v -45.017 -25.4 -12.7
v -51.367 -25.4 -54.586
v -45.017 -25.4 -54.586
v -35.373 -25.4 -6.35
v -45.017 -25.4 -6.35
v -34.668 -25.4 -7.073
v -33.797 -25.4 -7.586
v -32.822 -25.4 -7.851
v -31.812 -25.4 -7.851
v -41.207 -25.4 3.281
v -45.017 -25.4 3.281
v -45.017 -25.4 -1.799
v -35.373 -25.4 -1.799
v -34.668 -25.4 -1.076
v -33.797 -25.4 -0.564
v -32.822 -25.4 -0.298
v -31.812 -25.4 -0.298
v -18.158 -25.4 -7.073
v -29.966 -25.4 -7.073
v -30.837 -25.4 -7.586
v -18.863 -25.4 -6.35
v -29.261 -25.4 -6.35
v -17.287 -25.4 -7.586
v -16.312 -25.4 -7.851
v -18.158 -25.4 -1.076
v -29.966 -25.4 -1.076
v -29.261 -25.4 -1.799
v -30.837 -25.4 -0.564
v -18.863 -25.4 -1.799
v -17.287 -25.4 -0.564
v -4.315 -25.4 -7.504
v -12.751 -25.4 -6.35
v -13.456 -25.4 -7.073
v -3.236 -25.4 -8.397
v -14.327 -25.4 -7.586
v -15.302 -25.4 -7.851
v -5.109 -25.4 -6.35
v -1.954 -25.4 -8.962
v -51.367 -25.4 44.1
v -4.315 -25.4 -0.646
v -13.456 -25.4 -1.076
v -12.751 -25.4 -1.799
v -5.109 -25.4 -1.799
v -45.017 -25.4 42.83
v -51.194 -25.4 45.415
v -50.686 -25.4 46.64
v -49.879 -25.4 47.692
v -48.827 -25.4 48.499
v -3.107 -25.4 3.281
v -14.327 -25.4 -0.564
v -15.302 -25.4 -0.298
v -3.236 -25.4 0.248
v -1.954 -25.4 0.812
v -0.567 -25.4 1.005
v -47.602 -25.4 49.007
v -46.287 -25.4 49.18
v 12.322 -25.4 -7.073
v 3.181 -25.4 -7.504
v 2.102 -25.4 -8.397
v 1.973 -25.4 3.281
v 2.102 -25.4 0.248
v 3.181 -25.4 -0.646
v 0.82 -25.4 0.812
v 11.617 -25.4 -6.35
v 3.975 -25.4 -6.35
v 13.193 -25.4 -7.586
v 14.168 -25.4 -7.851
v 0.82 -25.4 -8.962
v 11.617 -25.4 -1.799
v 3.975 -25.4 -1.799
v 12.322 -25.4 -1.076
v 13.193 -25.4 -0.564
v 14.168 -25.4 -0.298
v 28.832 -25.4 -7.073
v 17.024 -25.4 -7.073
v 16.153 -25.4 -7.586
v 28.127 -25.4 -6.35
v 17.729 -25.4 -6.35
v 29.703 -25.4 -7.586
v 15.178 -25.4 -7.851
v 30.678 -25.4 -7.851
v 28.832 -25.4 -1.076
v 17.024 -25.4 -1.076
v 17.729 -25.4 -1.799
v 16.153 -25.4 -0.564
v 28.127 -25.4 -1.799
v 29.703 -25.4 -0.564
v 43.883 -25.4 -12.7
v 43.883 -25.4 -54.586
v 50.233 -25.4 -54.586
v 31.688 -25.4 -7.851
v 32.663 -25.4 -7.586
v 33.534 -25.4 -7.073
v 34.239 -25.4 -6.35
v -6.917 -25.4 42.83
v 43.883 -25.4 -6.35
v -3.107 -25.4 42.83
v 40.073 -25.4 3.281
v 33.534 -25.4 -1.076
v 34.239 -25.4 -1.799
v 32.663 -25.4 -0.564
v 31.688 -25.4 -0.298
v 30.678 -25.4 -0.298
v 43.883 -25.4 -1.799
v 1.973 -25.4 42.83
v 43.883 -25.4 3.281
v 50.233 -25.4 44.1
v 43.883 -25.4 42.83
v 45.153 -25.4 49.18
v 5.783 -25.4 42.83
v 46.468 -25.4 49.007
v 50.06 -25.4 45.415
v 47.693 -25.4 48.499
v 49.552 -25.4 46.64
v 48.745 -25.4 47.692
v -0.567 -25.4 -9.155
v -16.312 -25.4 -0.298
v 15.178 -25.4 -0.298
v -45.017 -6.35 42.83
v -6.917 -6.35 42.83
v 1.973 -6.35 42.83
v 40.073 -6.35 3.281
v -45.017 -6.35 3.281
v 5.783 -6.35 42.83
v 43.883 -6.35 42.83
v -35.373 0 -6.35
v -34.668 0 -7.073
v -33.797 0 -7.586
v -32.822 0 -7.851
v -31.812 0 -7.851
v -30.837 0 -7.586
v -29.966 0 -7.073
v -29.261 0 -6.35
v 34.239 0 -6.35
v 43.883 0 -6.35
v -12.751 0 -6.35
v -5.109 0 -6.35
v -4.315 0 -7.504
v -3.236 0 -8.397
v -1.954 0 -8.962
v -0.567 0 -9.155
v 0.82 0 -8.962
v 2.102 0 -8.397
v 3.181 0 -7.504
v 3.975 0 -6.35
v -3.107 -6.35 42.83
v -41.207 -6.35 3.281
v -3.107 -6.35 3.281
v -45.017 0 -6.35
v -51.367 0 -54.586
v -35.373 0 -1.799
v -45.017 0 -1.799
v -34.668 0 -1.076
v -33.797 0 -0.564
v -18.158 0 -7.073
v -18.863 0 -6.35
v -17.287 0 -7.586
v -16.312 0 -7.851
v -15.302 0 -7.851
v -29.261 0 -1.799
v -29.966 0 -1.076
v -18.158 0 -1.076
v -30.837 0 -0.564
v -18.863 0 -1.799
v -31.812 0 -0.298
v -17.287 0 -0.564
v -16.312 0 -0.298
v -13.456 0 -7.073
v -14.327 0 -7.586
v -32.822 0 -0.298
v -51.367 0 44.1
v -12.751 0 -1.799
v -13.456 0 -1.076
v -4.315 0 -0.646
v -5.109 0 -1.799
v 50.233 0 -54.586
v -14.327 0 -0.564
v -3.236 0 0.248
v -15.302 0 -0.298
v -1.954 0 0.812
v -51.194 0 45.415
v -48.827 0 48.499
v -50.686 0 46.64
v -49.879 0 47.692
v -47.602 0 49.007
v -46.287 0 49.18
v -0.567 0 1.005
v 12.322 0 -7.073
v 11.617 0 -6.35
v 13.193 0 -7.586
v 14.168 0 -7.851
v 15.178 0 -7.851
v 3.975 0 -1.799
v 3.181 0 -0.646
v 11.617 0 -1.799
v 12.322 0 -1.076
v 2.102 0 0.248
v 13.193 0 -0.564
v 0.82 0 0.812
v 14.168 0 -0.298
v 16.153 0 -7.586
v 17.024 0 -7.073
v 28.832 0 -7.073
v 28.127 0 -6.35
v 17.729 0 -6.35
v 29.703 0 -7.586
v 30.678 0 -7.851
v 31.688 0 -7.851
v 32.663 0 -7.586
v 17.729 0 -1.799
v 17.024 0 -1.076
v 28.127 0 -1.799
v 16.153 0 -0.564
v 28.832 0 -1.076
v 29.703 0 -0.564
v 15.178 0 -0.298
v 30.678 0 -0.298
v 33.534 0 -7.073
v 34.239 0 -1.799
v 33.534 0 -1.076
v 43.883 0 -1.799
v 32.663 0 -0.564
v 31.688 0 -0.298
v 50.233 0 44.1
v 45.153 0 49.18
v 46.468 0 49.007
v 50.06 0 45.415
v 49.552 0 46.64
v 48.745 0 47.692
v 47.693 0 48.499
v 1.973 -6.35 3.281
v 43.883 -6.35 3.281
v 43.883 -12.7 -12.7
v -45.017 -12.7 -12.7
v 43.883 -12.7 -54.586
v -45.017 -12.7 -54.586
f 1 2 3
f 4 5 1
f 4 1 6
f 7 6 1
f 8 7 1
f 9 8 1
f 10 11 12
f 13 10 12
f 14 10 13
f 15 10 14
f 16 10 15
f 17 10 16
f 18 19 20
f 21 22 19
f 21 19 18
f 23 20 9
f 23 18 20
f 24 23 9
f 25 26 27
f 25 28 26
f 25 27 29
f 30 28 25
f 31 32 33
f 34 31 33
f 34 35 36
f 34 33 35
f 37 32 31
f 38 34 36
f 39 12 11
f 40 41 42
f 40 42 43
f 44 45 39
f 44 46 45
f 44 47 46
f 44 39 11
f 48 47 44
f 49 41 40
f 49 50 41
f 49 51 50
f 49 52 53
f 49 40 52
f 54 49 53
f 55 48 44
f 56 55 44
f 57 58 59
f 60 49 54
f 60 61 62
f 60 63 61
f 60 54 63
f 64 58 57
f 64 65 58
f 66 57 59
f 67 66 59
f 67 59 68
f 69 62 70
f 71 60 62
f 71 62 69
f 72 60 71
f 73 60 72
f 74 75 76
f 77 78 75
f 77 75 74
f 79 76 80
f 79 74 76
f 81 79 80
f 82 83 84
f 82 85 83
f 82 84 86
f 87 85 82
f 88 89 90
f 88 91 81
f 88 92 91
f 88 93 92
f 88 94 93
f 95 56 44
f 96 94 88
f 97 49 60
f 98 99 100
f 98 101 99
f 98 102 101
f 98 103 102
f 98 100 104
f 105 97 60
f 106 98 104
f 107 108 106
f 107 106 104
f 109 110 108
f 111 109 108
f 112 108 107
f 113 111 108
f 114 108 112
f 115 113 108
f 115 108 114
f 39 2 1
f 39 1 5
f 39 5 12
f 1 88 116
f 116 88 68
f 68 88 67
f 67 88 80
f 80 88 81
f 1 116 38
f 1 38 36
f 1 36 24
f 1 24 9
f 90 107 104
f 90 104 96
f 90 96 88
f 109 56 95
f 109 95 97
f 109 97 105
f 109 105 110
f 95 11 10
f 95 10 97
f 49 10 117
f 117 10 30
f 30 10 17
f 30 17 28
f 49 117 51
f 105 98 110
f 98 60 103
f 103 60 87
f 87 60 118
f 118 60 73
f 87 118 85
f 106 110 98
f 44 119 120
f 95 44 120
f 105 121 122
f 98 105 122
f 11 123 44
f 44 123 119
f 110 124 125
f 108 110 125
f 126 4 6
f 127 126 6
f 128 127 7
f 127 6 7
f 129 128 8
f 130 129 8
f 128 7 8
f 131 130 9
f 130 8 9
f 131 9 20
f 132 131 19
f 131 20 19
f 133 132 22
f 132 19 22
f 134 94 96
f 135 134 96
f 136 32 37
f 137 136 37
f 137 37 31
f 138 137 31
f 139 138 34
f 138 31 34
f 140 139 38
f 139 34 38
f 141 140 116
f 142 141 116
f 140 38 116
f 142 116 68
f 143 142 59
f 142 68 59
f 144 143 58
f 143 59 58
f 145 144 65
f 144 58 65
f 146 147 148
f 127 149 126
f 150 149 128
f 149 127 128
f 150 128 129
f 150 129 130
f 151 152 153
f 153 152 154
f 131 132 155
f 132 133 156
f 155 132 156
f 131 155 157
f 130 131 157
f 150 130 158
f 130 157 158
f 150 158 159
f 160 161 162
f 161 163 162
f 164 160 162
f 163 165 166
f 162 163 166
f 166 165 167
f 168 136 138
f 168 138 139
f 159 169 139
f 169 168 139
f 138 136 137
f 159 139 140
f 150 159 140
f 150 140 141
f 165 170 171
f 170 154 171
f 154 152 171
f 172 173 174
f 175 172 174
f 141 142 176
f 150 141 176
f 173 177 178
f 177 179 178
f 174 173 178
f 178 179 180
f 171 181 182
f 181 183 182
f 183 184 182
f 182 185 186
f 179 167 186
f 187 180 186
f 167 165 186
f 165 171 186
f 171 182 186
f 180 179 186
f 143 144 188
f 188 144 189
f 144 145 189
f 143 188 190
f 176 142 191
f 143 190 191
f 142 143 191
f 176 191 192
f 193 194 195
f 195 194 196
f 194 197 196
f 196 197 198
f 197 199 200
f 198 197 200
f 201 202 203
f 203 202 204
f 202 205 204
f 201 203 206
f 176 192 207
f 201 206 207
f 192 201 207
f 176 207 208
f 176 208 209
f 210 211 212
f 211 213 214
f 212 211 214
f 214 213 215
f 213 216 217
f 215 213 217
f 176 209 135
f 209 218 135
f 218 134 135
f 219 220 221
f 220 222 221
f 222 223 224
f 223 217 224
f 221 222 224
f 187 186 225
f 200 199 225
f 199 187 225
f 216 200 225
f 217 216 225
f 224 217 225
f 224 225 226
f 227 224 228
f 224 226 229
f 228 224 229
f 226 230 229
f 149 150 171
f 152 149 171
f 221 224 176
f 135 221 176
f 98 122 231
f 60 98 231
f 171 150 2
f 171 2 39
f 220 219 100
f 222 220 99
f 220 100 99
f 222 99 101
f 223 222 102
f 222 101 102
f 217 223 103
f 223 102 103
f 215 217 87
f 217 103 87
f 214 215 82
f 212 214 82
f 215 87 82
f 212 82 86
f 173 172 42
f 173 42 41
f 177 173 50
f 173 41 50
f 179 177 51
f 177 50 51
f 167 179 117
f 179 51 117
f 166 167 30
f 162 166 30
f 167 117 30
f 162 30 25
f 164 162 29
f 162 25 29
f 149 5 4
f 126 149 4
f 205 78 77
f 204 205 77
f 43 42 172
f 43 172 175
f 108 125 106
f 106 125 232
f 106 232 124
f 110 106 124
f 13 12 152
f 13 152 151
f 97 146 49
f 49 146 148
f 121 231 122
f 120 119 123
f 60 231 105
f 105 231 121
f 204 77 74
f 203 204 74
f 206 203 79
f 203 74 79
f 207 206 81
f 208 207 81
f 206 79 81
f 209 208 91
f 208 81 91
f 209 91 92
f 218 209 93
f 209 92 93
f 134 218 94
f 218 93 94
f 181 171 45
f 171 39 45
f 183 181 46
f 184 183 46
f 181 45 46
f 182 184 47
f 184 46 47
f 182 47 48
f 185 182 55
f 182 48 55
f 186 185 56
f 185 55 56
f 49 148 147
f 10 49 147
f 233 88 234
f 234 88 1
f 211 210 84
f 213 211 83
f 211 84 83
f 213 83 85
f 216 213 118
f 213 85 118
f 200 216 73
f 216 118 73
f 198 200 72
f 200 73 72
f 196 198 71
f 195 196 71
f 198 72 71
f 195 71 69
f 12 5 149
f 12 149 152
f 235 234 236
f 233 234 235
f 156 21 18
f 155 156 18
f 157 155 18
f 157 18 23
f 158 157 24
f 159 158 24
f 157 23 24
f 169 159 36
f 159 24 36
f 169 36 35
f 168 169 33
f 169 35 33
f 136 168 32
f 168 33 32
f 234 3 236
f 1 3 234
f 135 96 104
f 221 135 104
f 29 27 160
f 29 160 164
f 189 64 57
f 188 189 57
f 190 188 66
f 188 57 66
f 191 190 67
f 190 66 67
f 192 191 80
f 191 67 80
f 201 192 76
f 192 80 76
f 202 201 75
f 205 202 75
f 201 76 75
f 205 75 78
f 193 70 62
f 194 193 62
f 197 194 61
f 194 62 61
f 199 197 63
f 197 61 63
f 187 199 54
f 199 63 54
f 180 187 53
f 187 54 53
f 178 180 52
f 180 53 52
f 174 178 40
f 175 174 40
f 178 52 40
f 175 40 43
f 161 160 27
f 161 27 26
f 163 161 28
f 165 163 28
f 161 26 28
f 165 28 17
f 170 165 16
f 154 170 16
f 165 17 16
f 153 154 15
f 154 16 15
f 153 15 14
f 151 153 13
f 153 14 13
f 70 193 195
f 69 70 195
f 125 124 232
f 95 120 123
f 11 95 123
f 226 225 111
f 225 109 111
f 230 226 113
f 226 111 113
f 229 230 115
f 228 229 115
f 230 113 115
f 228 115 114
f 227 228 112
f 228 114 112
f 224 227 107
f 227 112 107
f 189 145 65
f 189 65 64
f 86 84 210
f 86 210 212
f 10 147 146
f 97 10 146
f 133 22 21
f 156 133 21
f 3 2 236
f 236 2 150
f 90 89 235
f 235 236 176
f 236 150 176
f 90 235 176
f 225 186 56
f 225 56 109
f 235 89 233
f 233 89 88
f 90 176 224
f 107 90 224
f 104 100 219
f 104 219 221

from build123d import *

# Parameters (mm, degrees)
F0_W      = 101.6
F0_H      = 103.766376869
F1_DEPTH  = 25.4
F2_DEPTH  = 6.35
F3_R      = 5.08
F4_W      = 88.9
F4_H      = 4.550592151
F5_DEPTH  = 25.4
F6_W      = 41.91
F6_H      = 35.5364200096
F6_W_2    = 5.08
F7_DEPTH  = 12.7
F8_W      = 88.9
F8_H      = 6.35
F9_DEPTH  = 12.7
F11_DEPTH = 25.4


with BuildPart() as f1:
    # F0 (on Front) → F1 (new body)
    with BuildSketch(Plane.XZ):
        with Locations((-0.5670151889, -2.7032315751)):
            Rectangle(F0_W, F0_H)
        Polygon((-45.0170151889, 3.280592151), (-45.0170151889, 42.8299568594), (-6.9170151889, 42.8299568594), align=None, mode=Mode.SUBTRACT)
        Polygon((-3.1070151889, 3.280592151), (-41.2070151889, 3.280592151), (-3.1070151889, 42.8299568594), align=None, mode=Mode.SUBTRACT)
        Polygon((1.9729848111, 42.8299568594), (40.0729848111, 3.280592151), (1.9729848111, 3.280592151), align=None, mode=Mode.SUBTRACT)
        Polygon((5.7829848111, 42.8299568594), (43.8829848111, 42.8299568594), (43.8829848111, 3.280592151), align=None, mode=Mode.SUBTRACT)
    extrude(amount=F1_DEPTH)

    # F0 (on Front) → F2 (join)
    with BuildSketch(Plane.XZ):
        Polygon((-6.9170151889, 42.8299568594), (-45.0170151889, 42.8299568594), (-45.0170151889, 3.280592151), align=None)
        Polygon((-3.1070151889, 42.8299568594), (-41.2070151889, 3.280592151), (-3.1070151889, 3.280592151), align=None)
        Polygon((1.9729848111, 3.280592151), (40.0729848111, 3.280592151), (1.9729848111, 42.8299568594), align=None)
        Polygon((43.8829848111, 3.280592151), (43.8829848111, 42.8299568594), (5.7829848111, 42.8299568594), align=None)
    extrude(amount=F2_DEPTH)

    # F3
    f3_edges = [f1.edges().sort_by_distance(p)[0] for p in [
        (-51.367015, -12.7, 49.179957),
        (50.232985, -12.7, 49.179957),
    ]]
    fillet(f3_edges, radius=F3_R)

    # F4 (on face) → F5 (cut)
    with BuildSketch(Plane.XZ.offset(25.4)):
        with Locations((-0.5670151889, -4.0747039245)):
            Rectangle(F4_W, F4_H)
    extrude(amount=-F5_DEPTH, mode=Mode.SUBTRACT)

    # F6 (on face) → F7 (cut)
    with BuildSketch(Plane.XZ.offset(25.4)):
        with Locations((-24.0620151889, -30.4682100048)):
            Rectangle(F6_W, F6_H)
        with Locations((22.9279848111, -30.4682100048)):
            Rectangle(F6_W, F6_H)
        with Locations((-0.5670151889, -30.4682100048)):
            Rectangle(F6_W_2, F6_H)
    extrude(amount=-F7_DEPTH, mode=Mode.SUBTRACT)

    # F8 (on face) → F9 (cut)
    with BuildSketch(Plane.XZ.offset(25.4)):
        with Locations((-0.5670151889, -51.4114200096)):
            Rectangle(F8_W, F8_H)
    extrude(amount=-F9_DEPTH, mode=Mode.SUBTRACT)

    # F10 (on face) → F11 (cut)
    with BuildSketch(Plane.XZ.offset(25.4)):
        with BuildLine():
            ThreePointArc((-28.5070151889, -4.0747039245), (-32.3170151889, -0.2647039245), (-36.1270151889, -4.0747039245))
            Line((-36.1270151889, -4.0747039245), (-28.5070151889, -4.0747039245))
        make_face()
        with BuildLine():
            ThreePointArc((34.9929848111, -4.0747039245), (31.1829848111, -0.2647039245), (27.3729848111, -4.0747039245))
            Line((27.3729848111, -4.0747039245), (34.9929848111, -4.0747039245))
        make_face()
        with BuildLine():
            Line((34.9929848111, -4.0747039245), (27.3729848111, -4.0747039245))
            ThreePointArc((27.3729848111, -4.0747039245), (31.1829848111, -7.8847039245), (34.9929848111, -4.0747039245))
        make_face()
        with BuildLine():
            ThreePointArc((18.4829848111, -4.0747039245), (14.6729848111, -0.2647039245), (10.8629848111, -4.0747039245))
            Line((10.8629848111, -4.0747039245), (18.4829848111, -4.0747039245))
        make_face()
        with BuildLine():
            Line((18.4829848111, -4.0747039245), (10.8629848111, -4.0747039245))
            ThreePointArc((10.8629848111, -4.0747039245), (14.6729848111, -7.8847039245), (18.4829848111, -4.0747039245))
        make_face()
        with BuildLine():
            ThreePointArc((4.5129848111, -4.0747039245), (-0.5670151889, 1.0052960755), (-5.6470151889, -4.0747039245))
            Line((-5.6470151889, -4.0747039245), (4.5129848111, -4.0747039245))
        make_face()
        with BuildLine():
            Line((4.5129848111, -4.0747039245), (-5.6470151889, -4.0747039245))
            ThreePointArc((-5.6470151889, -4.0747039245), (-0.5670151889, -9.1547039245), (4.5129848111, -4.0747039245))
        make_face()
        with BuildLine():
            ThreePointArc((-11.9970151889, -4.0747039245), (-15.8070151889, -0.2647039245), (-19.6170151889, -4.0747039245))
            Line((-19.6170151889, -4.0747039245), (-11.9970151889, -4.0747039245))
        make_face()
        with BuildLine():
            Line((-11.9970151889, -4.0747039245), (-19.6170151889, -4.0747039245))
            ThreePointArc((-19.6170151889, -4.0747039245), (-15.8070151889, -7.8847039245), (-11.9970151889, -4.0747039245))
        make_face()
        with BuildLine():
            Line((-28.5070151889, -4.0747039245), (-36.1270151889, -4.0747039245))
            ThreePointArc((-36.1270151889, -4.0747039245), (-32.3170151889, -7.8847039245), (-28.5070151889, -4.0747039245))
        make_face()
    extrude(amount=-F11_DEPTH, mode=Mode.SUBTRACT)


solid = f1.part
